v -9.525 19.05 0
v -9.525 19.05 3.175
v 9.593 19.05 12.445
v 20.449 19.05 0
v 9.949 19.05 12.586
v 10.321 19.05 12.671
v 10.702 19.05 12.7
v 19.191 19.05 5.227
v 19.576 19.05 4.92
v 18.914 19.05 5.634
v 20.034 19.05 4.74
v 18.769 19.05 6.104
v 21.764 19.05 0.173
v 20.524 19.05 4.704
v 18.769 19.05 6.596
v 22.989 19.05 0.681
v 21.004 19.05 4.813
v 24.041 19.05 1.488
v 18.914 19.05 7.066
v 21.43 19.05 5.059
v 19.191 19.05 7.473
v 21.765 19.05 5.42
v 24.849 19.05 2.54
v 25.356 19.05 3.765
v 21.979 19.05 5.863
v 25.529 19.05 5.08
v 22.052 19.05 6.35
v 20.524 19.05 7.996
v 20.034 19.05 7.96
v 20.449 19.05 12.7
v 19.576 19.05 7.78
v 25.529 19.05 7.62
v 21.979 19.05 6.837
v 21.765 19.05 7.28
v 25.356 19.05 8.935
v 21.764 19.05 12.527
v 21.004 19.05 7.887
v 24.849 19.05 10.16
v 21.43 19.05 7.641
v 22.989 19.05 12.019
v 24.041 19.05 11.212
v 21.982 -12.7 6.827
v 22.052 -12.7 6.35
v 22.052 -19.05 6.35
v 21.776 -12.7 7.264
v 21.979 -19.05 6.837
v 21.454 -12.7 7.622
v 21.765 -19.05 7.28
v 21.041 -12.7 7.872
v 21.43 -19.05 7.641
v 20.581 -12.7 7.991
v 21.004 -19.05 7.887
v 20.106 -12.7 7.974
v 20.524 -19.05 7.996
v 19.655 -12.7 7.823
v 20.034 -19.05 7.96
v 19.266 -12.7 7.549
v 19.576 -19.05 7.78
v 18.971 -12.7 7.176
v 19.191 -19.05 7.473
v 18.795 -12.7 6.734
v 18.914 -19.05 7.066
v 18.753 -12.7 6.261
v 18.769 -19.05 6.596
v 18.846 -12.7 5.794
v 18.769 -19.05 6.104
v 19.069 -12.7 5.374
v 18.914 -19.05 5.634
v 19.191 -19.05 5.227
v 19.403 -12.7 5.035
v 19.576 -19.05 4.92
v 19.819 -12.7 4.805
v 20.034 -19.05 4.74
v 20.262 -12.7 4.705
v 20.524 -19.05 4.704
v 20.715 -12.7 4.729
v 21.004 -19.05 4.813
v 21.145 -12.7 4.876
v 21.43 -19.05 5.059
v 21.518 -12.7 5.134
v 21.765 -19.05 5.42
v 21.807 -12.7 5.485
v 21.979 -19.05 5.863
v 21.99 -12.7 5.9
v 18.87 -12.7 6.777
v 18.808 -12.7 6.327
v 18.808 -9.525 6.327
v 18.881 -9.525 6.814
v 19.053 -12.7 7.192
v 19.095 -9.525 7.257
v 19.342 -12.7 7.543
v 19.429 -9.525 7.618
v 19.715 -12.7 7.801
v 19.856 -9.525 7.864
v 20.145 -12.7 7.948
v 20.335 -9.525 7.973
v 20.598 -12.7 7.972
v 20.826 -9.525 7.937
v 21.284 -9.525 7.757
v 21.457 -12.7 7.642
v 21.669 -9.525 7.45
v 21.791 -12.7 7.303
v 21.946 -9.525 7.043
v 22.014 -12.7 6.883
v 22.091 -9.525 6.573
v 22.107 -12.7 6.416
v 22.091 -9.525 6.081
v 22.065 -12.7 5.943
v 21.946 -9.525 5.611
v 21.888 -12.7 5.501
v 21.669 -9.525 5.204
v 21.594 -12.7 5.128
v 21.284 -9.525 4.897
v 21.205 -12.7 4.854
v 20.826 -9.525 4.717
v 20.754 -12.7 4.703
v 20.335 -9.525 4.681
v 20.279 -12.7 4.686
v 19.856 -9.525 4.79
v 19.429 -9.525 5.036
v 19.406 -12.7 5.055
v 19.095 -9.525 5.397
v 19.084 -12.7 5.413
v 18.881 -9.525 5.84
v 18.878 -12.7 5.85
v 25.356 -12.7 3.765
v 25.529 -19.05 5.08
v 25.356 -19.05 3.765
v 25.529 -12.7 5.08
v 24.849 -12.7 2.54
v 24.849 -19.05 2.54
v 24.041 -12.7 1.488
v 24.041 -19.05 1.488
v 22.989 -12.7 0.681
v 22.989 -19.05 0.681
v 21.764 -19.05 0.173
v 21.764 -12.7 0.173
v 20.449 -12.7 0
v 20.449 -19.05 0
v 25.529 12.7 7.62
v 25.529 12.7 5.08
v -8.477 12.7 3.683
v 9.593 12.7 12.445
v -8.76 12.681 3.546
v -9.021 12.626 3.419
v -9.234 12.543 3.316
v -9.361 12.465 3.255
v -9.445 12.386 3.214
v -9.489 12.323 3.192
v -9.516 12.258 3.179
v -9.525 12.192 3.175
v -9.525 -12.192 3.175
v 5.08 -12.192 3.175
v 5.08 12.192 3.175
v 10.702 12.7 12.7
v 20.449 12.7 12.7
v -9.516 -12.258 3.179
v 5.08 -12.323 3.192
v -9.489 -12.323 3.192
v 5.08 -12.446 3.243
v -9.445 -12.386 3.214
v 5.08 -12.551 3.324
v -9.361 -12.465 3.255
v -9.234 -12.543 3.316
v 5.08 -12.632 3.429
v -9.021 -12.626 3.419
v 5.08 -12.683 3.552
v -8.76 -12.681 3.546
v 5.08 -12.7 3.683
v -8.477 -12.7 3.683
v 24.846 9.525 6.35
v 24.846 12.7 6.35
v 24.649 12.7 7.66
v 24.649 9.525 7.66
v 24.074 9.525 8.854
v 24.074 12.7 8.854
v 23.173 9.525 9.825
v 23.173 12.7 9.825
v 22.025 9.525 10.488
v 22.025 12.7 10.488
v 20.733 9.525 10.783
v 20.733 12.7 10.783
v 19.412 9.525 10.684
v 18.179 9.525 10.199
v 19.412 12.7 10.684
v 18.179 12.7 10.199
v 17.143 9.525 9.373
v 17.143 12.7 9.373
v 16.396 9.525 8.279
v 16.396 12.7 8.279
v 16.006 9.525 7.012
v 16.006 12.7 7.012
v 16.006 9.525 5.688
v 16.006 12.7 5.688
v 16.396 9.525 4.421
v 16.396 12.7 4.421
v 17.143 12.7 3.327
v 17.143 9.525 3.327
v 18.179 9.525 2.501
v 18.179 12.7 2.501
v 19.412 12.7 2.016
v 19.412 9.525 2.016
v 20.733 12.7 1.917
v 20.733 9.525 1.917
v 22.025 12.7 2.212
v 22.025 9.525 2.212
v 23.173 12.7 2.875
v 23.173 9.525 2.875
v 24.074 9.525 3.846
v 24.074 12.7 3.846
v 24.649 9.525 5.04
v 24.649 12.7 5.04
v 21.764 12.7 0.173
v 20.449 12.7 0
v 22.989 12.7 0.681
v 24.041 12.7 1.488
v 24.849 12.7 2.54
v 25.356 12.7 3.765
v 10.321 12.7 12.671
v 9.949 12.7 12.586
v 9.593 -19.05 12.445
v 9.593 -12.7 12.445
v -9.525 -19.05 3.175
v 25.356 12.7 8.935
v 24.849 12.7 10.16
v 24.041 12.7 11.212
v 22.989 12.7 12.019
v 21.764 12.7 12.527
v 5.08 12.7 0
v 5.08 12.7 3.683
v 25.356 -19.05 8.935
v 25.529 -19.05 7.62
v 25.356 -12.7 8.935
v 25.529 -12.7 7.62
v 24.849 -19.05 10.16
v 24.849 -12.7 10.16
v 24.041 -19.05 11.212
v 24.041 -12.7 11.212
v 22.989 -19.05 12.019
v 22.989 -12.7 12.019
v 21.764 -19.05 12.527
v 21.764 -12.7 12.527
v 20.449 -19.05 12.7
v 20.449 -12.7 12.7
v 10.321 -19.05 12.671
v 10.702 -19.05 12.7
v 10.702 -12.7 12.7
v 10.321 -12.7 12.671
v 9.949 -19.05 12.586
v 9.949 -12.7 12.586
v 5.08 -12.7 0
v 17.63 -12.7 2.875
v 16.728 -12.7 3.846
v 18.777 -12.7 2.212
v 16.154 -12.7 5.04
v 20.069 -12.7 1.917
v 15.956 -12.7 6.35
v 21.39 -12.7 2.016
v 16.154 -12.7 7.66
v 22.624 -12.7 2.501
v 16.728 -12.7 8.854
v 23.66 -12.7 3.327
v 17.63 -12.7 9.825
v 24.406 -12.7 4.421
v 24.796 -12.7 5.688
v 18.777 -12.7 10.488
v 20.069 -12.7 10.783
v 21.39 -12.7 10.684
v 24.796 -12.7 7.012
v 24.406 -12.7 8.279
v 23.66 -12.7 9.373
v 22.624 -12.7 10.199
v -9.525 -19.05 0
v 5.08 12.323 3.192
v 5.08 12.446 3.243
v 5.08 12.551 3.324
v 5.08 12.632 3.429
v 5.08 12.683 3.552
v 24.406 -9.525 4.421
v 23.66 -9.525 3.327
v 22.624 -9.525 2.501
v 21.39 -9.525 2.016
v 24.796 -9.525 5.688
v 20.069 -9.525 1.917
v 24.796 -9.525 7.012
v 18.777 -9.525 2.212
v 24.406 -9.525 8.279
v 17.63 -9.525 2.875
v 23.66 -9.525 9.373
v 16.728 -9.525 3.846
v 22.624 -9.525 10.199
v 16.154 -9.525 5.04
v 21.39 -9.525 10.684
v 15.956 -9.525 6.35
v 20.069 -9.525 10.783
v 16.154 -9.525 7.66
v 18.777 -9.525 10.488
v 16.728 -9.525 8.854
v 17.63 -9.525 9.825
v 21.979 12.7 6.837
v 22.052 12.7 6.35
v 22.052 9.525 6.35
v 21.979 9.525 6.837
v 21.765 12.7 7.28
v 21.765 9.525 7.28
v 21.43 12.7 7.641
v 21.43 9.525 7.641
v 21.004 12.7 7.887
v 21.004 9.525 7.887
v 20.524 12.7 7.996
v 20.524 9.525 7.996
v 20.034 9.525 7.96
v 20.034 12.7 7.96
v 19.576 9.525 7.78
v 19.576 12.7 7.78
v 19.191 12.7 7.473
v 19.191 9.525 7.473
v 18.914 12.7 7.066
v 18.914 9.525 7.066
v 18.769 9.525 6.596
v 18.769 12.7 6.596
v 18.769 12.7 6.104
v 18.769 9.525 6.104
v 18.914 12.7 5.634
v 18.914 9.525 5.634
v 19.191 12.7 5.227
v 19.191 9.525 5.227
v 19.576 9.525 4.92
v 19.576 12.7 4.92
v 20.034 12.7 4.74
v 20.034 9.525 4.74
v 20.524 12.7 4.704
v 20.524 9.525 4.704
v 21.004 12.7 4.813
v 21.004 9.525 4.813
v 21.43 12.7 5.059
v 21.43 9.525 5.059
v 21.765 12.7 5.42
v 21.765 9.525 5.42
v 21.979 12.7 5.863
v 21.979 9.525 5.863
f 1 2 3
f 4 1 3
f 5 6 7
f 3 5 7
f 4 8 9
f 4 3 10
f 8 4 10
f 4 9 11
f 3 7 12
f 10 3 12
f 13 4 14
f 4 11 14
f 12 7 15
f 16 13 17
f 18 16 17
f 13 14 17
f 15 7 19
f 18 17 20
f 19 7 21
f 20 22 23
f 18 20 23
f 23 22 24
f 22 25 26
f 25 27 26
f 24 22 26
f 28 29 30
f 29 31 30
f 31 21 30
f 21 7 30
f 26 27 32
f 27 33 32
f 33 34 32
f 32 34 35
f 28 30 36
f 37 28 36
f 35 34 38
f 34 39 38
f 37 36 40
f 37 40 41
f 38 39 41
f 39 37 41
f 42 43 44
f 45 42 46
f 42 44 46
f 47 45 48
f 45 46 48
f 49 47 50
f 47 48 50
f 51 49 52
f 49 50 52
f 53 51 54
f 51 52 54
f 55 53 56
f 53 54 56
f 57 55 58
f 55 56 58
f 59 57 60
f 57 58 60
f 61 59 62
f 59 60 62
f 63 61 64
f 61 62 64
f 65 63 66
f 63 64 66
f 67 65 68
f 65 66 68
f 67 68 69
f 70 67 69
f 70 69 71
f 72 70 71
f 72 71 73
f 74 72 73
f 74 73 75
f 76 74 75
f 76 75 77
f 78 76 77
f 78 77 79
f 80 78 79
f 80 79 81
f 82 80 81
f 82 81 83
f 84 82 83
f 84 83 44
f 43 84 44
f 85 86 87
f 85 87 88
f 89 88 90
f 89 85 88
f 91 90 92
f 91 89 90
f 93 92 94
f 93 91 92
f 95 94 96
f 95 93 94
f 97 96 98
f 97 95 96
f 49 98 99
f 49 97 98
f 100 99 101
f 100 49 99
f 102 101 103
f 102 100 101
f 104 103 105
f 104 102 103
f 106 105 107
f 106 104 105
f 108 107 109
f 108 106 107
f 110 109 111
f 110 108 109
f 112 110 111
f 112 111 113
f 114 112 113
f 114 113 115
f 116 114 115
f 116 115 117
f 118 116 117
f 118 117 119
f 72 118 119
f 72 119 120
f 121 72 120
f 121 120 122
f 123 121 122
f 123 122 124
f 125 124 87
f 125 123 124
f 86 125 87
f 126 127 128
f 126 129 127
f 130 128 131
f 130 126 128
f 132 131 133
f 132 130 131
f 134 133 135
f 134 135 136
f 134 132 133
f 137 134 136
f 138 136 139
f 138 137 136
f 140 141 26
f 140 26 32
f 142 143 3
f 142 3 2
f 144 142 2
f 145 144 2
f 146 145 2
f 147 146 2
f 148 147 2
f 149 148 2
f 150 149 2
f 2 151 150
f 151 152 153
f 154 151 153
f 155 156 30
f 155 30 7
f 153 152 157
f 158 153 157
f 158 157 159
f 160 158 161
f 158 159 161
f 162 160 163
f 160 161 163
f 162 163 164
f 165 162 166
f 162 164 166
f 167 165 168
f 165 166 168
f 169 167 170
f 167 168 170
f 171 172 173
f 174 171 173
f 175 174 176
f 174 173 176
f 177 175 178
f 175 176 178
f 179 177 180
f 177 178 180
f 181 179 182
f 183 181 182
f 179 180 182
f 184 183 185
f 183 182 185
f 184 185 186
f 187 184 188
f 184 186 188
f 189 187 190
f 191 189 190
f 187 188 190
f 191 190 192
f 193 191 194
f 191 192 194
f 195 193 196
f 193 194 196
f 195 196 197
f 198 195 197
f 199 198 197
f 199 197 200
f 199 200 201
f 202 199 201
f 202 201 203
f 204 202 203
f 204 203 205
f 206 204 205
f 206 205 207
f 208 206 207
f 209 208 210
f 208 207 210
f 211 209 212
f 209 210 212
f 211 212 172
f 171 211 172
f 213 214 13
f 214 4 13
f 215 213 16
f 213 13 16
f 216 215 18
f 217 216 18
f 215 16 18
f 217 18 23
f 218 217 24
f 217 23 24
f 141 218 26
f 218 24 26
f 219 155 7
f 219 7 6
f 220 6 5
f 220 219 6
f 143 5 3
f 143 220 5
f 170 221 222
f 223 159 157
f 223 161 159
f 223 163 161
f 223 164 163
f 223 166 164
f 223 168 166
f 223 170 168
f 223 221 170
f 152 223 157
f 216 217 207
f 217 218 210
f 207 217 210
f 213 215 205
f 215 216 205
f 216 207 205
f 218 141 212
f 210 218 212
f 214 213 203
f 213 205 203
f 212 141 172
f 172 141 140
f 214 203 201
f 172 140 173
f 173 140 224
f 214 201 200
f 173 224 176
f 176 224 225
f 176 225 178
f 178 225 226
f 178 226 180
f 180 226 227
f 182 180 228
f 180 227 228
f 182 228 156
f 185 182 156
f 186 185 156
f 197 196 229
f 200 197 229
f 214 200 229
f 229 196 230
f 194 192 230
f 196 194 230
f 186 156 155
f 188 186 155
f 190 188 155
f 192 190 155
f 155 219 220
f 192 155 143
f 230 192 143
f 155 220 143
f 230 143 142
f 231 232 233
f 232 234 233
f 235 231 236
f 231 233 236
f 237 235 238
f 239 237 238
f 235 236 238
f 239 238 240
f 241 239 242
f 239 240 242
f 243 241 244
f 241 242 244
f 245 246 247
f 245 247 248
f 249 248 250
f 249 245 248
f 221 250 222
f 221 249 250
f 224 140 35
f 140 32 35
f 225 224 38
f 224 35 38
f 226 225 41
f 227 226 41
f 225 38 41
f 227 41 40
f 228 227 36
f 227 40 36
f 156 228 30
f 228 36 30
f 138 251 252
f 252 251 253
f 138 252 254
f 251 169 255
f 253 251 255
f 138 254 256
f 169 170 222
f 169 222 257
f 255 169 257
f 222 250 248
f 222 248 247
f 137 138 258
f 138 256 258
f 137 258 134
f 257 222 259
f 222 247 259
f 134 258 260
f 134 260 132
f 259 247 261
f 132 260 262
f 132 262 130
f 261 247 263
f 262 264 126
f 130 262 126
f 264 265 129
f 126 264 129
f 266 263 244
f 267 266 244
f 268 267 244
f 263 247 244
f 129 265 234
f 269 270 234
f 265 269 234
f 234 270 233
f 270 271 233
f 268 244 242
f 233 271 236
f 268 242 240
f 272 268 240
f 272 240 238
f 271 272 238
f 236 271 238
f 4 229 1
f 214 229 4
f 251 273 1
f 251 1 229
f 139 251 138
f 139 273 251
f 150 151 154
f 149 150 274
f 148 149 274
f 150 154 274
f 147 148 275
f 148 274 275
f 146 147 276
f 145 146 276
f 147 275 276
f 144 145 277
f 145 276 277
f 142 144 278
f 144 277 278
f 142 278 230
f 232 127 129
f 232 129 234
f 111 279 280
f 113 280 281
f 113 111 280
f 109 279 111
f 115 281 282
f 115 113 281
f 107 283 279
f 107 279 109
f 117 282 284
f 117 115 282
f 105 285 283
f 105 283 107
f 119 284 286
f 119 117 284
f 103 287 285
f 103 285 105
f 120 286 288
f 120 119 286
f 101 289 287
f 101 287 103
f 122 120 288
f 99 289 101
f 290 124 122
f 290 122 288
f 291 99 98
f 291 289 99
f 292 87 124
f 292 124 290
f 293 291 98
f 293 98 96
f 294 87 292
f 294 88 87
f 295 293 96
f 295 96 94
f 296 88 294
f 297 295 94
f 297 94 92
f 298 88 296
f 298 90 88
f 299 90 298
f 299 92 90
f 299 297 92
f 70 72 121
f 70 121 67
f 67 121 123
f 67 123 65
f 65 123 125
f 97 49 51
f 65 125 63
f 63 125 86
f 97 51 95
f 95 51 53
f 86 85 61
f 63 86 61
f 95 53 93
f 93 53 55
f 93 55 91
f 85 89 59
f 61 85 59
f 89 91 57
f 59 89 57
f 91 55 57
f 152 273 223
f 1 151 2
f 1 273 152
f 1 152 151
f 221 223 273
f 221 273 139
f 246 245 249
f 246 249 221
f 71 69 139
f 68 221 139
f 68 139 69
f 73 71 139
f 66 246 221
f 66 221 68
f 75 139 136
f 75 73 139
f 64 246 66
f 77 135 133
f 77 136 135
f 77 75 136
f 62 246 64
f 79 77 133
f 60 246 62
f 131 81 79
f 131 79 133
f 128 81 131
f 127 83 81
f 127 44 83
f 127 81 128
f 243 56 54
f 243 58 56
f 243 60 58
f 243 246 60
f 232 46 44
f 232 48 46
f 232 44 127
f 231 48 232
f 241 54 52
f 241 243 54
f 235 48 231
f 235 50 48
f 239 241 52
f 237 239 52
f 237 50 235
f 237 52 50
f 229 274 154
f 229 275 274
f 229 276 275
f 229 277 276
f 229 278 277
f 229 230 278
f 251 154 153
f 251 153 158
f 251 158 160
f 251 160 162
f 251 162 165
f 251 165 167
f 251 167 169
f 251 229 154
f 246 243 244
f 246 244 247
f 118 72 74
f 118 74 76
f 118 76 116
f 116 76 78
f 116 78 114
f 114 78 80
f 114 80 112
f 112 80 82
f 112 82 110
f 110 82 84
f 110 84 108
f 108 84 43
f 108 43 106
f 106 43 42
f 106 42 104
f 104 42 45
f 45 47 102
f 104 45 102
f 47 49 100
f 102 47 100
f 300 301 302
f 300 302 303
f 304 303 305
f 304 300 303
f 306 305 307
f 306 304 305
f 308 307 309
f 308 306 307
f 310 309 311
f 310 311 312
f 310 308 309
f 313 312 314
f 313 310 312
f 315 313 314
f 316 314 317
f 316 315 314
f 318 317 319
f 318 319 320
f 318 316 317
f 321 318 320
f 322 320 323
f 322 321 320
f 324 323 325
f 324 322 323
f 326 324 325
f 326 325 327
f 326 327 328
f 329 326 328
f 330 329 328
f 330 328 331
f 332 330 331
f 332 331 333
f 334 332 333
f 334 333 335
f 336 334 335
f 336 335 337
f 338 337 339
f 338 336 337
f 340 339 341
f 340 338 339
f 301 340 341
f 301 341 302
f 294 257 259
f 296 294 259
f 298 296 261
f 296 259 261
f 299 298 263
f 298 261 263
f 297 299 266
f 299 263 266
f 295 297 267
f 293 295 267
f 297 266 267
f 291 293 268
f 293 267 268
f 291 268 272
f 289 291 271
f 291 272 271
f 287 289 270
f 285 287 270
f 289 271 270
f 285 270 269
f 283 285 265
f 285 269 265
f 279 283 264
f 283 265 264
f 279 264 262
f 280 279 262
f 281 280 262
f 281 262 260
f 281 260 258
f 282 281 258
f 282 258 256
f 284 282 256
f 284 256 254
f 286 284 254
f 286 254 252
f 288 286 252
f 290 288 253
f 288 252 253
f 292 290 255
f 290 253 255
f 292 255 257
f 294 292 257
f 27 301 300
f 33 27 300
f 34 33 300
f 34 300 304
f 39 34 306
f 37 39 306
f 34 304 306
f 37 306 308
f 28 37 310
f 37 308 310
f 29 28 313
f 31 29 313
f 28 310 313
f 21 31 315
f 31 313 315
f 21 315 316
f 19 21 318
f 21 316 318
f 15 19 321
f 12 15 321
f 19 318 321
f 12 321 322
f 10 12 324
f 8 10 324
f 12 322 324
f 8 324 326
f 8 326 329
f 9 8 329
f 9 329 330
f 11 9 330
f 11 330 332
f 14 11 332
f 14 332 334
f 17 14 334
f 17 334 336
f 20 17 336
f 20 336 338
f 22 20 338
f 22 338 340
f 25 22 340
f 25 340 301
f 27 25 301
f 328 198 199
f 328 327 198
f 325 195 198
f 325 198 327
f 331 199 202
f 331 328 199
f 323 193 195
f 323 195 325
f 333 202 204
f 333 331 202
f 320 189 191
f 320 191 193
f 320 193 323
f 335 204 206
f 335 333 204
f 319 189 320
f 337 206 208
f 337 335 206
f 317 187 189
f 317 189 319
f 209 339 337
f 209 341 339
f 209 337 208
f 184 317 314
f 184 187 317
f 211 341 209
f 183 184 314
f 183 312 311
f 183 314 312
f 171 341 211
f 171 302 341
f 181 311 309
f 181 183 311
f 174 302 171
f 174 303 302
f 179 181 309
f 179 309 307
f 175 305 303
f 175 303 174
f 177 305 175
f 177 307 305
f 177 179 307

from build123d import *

# Parameters (mm, degrees)
F0_W      = 19.05
F0_H      = 38.1
F1_DEPTH  = 3.175
F2_R      = 1.651
F3_DEPTH  = 38.1
F4_W      = 10.7016550345
F4_H      = 25.4
F4_W_2    = 14.8274536716
F4_W_3    = 9.9113590219
F5_DEPTH  = 12.701
F6_R      = 5.08
F7_W      = 30.0603830089
F7_H      = 25.4
F8_DEPTH  = 9.525
F9_R      = 4.445
F9_R_2    = 1.651
F10_DEPTH = 3.175
F11_R     = 4.445
F11_R_2   = 1.651
F12_DEPTH = 3.175
F13_W     = 5.08
F13_H     = 25.4
F14_DEPTH = 3.175
F15_R     = 0.508


with BuildPart() as f1:
    # F0 (on Top) → F1 (new body)
    with BuildSketch(Plane.XY):
        Rectangle(F0_W, F0_H)
    extrude(amount=F1_DEPTH)

    # F2 (on face) → F3 (join, through all)
    with BuildSketch(Plane.XZ.offset(19.05)):
        with BuildLine():
            Line((25.5291087061, 0), (25.5291087061, 12.7))
            Line((25.5291087061, 12.7), (10.7016550345, 12.7))
            ThreePointArc((10.7016550345, 12.7), (10.1331167238, 12.6355533097), (9.5934291315, 12.4454836136))
            Line((9.5934291315, 12.4454836136), (-9.525, 3.175))
            Line((-9.525, 3.175), (9.525, 3.175))
            Line((9.525, 3.175), (9.525, 0))
            Line((9.525, 0), (14.3506696127, 0))
            Line((14.3506696127, 0), (25.5291087061, 0))
        make_face()
        with Locations((20.4010959715, 6.35)):
            Circle(F2_R, mode=Mode.SUBTRACT)
    extrude(amount=-F3_DEPTH)

    # F4 (on face) → F5 (cut, through all)
    with BuildSketch(Plane.XY.offset(12.7)):
        with Locations((5.3508275173, 0)):
            Rectangle(F4_W, F4_H)
        with Locations((18.1153818703, 0)):
            Rectangle(F4_W_2, F4_H)
        with Locations((30.4847882171, 0)):
            Rectangle(F4_W_3, F4_H)
    extrude(amount=-F5_DEPTH, mode=Mode.SUBTRACT)

    # F6
    f6_edges = [f1.edges().sort_by_distance(p)[0] for p in [
        (25.529109, -15.875, 12.7),
        (25.529109, -15.875, 0),
        (25.529109, 15.875, 0),
        (25.529109, 15.875, 12.7),
    ]]
    fillet(f6_edges, radius=F6_R)

    # F7 (on face) → F8 (cut, through all)
    with BuildSketch(Plane.XY.offset(12.7)):
        with Locations((-4.3285364699, 0)):
            Rectangle(F7_W, F7_H)
    extrude(amount=-F8_DEPTH, mode=Mode.SUBTRACT)

    # F9 (on face) → F10 (join)
    with BuildSketch(Plane(origin=(0, -12.7, 0), x_dir=(-1, 0, 0), z_dir=(0, 1, 0))):
        with Locations((-20.4010959715, 6.35)):
            Circle(F9_R)
        with Locations((-20.4588528723, 6.3269766979)):
            Circle(F9_R_2, mode=Mode.SUBTRACT)
    extrude(amount=F10_DEPTH)

    # F11 (on face) → F12 (join)
    with BuildSketch(Plane.XZ.offset(-12.7)):
        with Locations((20.4010959715, 6.35)):
            Circle(F11_R)
        with Locations((20.4010959715, 6.35)):
            Circle(F11_R_2, mode=Mode.SUBTRACT)
    extrude(amount=F12_DEPTH)

    # F13 (on face) → F14 (join, through all)
    with BuildSketch(Plane(origin=(0, 0, 0), x_dir=(1, 0, 0), z_dir=(0, 0, -1))):
        with Locations((2.54, 0)):
            Rectangle(F13_W, F13_H)
    extrude(amount=-F14_DEPTH)

    # F15
    f15_edges = [f1.edges().sort_by_distance(p)[0] for p in [
        (-2.2225, -12.7, 3.175),
        (-2.2225, 12.7, 3.175),
    ]]
    fillet(f15_edges, radius=F15_R)


solid = f1.part
